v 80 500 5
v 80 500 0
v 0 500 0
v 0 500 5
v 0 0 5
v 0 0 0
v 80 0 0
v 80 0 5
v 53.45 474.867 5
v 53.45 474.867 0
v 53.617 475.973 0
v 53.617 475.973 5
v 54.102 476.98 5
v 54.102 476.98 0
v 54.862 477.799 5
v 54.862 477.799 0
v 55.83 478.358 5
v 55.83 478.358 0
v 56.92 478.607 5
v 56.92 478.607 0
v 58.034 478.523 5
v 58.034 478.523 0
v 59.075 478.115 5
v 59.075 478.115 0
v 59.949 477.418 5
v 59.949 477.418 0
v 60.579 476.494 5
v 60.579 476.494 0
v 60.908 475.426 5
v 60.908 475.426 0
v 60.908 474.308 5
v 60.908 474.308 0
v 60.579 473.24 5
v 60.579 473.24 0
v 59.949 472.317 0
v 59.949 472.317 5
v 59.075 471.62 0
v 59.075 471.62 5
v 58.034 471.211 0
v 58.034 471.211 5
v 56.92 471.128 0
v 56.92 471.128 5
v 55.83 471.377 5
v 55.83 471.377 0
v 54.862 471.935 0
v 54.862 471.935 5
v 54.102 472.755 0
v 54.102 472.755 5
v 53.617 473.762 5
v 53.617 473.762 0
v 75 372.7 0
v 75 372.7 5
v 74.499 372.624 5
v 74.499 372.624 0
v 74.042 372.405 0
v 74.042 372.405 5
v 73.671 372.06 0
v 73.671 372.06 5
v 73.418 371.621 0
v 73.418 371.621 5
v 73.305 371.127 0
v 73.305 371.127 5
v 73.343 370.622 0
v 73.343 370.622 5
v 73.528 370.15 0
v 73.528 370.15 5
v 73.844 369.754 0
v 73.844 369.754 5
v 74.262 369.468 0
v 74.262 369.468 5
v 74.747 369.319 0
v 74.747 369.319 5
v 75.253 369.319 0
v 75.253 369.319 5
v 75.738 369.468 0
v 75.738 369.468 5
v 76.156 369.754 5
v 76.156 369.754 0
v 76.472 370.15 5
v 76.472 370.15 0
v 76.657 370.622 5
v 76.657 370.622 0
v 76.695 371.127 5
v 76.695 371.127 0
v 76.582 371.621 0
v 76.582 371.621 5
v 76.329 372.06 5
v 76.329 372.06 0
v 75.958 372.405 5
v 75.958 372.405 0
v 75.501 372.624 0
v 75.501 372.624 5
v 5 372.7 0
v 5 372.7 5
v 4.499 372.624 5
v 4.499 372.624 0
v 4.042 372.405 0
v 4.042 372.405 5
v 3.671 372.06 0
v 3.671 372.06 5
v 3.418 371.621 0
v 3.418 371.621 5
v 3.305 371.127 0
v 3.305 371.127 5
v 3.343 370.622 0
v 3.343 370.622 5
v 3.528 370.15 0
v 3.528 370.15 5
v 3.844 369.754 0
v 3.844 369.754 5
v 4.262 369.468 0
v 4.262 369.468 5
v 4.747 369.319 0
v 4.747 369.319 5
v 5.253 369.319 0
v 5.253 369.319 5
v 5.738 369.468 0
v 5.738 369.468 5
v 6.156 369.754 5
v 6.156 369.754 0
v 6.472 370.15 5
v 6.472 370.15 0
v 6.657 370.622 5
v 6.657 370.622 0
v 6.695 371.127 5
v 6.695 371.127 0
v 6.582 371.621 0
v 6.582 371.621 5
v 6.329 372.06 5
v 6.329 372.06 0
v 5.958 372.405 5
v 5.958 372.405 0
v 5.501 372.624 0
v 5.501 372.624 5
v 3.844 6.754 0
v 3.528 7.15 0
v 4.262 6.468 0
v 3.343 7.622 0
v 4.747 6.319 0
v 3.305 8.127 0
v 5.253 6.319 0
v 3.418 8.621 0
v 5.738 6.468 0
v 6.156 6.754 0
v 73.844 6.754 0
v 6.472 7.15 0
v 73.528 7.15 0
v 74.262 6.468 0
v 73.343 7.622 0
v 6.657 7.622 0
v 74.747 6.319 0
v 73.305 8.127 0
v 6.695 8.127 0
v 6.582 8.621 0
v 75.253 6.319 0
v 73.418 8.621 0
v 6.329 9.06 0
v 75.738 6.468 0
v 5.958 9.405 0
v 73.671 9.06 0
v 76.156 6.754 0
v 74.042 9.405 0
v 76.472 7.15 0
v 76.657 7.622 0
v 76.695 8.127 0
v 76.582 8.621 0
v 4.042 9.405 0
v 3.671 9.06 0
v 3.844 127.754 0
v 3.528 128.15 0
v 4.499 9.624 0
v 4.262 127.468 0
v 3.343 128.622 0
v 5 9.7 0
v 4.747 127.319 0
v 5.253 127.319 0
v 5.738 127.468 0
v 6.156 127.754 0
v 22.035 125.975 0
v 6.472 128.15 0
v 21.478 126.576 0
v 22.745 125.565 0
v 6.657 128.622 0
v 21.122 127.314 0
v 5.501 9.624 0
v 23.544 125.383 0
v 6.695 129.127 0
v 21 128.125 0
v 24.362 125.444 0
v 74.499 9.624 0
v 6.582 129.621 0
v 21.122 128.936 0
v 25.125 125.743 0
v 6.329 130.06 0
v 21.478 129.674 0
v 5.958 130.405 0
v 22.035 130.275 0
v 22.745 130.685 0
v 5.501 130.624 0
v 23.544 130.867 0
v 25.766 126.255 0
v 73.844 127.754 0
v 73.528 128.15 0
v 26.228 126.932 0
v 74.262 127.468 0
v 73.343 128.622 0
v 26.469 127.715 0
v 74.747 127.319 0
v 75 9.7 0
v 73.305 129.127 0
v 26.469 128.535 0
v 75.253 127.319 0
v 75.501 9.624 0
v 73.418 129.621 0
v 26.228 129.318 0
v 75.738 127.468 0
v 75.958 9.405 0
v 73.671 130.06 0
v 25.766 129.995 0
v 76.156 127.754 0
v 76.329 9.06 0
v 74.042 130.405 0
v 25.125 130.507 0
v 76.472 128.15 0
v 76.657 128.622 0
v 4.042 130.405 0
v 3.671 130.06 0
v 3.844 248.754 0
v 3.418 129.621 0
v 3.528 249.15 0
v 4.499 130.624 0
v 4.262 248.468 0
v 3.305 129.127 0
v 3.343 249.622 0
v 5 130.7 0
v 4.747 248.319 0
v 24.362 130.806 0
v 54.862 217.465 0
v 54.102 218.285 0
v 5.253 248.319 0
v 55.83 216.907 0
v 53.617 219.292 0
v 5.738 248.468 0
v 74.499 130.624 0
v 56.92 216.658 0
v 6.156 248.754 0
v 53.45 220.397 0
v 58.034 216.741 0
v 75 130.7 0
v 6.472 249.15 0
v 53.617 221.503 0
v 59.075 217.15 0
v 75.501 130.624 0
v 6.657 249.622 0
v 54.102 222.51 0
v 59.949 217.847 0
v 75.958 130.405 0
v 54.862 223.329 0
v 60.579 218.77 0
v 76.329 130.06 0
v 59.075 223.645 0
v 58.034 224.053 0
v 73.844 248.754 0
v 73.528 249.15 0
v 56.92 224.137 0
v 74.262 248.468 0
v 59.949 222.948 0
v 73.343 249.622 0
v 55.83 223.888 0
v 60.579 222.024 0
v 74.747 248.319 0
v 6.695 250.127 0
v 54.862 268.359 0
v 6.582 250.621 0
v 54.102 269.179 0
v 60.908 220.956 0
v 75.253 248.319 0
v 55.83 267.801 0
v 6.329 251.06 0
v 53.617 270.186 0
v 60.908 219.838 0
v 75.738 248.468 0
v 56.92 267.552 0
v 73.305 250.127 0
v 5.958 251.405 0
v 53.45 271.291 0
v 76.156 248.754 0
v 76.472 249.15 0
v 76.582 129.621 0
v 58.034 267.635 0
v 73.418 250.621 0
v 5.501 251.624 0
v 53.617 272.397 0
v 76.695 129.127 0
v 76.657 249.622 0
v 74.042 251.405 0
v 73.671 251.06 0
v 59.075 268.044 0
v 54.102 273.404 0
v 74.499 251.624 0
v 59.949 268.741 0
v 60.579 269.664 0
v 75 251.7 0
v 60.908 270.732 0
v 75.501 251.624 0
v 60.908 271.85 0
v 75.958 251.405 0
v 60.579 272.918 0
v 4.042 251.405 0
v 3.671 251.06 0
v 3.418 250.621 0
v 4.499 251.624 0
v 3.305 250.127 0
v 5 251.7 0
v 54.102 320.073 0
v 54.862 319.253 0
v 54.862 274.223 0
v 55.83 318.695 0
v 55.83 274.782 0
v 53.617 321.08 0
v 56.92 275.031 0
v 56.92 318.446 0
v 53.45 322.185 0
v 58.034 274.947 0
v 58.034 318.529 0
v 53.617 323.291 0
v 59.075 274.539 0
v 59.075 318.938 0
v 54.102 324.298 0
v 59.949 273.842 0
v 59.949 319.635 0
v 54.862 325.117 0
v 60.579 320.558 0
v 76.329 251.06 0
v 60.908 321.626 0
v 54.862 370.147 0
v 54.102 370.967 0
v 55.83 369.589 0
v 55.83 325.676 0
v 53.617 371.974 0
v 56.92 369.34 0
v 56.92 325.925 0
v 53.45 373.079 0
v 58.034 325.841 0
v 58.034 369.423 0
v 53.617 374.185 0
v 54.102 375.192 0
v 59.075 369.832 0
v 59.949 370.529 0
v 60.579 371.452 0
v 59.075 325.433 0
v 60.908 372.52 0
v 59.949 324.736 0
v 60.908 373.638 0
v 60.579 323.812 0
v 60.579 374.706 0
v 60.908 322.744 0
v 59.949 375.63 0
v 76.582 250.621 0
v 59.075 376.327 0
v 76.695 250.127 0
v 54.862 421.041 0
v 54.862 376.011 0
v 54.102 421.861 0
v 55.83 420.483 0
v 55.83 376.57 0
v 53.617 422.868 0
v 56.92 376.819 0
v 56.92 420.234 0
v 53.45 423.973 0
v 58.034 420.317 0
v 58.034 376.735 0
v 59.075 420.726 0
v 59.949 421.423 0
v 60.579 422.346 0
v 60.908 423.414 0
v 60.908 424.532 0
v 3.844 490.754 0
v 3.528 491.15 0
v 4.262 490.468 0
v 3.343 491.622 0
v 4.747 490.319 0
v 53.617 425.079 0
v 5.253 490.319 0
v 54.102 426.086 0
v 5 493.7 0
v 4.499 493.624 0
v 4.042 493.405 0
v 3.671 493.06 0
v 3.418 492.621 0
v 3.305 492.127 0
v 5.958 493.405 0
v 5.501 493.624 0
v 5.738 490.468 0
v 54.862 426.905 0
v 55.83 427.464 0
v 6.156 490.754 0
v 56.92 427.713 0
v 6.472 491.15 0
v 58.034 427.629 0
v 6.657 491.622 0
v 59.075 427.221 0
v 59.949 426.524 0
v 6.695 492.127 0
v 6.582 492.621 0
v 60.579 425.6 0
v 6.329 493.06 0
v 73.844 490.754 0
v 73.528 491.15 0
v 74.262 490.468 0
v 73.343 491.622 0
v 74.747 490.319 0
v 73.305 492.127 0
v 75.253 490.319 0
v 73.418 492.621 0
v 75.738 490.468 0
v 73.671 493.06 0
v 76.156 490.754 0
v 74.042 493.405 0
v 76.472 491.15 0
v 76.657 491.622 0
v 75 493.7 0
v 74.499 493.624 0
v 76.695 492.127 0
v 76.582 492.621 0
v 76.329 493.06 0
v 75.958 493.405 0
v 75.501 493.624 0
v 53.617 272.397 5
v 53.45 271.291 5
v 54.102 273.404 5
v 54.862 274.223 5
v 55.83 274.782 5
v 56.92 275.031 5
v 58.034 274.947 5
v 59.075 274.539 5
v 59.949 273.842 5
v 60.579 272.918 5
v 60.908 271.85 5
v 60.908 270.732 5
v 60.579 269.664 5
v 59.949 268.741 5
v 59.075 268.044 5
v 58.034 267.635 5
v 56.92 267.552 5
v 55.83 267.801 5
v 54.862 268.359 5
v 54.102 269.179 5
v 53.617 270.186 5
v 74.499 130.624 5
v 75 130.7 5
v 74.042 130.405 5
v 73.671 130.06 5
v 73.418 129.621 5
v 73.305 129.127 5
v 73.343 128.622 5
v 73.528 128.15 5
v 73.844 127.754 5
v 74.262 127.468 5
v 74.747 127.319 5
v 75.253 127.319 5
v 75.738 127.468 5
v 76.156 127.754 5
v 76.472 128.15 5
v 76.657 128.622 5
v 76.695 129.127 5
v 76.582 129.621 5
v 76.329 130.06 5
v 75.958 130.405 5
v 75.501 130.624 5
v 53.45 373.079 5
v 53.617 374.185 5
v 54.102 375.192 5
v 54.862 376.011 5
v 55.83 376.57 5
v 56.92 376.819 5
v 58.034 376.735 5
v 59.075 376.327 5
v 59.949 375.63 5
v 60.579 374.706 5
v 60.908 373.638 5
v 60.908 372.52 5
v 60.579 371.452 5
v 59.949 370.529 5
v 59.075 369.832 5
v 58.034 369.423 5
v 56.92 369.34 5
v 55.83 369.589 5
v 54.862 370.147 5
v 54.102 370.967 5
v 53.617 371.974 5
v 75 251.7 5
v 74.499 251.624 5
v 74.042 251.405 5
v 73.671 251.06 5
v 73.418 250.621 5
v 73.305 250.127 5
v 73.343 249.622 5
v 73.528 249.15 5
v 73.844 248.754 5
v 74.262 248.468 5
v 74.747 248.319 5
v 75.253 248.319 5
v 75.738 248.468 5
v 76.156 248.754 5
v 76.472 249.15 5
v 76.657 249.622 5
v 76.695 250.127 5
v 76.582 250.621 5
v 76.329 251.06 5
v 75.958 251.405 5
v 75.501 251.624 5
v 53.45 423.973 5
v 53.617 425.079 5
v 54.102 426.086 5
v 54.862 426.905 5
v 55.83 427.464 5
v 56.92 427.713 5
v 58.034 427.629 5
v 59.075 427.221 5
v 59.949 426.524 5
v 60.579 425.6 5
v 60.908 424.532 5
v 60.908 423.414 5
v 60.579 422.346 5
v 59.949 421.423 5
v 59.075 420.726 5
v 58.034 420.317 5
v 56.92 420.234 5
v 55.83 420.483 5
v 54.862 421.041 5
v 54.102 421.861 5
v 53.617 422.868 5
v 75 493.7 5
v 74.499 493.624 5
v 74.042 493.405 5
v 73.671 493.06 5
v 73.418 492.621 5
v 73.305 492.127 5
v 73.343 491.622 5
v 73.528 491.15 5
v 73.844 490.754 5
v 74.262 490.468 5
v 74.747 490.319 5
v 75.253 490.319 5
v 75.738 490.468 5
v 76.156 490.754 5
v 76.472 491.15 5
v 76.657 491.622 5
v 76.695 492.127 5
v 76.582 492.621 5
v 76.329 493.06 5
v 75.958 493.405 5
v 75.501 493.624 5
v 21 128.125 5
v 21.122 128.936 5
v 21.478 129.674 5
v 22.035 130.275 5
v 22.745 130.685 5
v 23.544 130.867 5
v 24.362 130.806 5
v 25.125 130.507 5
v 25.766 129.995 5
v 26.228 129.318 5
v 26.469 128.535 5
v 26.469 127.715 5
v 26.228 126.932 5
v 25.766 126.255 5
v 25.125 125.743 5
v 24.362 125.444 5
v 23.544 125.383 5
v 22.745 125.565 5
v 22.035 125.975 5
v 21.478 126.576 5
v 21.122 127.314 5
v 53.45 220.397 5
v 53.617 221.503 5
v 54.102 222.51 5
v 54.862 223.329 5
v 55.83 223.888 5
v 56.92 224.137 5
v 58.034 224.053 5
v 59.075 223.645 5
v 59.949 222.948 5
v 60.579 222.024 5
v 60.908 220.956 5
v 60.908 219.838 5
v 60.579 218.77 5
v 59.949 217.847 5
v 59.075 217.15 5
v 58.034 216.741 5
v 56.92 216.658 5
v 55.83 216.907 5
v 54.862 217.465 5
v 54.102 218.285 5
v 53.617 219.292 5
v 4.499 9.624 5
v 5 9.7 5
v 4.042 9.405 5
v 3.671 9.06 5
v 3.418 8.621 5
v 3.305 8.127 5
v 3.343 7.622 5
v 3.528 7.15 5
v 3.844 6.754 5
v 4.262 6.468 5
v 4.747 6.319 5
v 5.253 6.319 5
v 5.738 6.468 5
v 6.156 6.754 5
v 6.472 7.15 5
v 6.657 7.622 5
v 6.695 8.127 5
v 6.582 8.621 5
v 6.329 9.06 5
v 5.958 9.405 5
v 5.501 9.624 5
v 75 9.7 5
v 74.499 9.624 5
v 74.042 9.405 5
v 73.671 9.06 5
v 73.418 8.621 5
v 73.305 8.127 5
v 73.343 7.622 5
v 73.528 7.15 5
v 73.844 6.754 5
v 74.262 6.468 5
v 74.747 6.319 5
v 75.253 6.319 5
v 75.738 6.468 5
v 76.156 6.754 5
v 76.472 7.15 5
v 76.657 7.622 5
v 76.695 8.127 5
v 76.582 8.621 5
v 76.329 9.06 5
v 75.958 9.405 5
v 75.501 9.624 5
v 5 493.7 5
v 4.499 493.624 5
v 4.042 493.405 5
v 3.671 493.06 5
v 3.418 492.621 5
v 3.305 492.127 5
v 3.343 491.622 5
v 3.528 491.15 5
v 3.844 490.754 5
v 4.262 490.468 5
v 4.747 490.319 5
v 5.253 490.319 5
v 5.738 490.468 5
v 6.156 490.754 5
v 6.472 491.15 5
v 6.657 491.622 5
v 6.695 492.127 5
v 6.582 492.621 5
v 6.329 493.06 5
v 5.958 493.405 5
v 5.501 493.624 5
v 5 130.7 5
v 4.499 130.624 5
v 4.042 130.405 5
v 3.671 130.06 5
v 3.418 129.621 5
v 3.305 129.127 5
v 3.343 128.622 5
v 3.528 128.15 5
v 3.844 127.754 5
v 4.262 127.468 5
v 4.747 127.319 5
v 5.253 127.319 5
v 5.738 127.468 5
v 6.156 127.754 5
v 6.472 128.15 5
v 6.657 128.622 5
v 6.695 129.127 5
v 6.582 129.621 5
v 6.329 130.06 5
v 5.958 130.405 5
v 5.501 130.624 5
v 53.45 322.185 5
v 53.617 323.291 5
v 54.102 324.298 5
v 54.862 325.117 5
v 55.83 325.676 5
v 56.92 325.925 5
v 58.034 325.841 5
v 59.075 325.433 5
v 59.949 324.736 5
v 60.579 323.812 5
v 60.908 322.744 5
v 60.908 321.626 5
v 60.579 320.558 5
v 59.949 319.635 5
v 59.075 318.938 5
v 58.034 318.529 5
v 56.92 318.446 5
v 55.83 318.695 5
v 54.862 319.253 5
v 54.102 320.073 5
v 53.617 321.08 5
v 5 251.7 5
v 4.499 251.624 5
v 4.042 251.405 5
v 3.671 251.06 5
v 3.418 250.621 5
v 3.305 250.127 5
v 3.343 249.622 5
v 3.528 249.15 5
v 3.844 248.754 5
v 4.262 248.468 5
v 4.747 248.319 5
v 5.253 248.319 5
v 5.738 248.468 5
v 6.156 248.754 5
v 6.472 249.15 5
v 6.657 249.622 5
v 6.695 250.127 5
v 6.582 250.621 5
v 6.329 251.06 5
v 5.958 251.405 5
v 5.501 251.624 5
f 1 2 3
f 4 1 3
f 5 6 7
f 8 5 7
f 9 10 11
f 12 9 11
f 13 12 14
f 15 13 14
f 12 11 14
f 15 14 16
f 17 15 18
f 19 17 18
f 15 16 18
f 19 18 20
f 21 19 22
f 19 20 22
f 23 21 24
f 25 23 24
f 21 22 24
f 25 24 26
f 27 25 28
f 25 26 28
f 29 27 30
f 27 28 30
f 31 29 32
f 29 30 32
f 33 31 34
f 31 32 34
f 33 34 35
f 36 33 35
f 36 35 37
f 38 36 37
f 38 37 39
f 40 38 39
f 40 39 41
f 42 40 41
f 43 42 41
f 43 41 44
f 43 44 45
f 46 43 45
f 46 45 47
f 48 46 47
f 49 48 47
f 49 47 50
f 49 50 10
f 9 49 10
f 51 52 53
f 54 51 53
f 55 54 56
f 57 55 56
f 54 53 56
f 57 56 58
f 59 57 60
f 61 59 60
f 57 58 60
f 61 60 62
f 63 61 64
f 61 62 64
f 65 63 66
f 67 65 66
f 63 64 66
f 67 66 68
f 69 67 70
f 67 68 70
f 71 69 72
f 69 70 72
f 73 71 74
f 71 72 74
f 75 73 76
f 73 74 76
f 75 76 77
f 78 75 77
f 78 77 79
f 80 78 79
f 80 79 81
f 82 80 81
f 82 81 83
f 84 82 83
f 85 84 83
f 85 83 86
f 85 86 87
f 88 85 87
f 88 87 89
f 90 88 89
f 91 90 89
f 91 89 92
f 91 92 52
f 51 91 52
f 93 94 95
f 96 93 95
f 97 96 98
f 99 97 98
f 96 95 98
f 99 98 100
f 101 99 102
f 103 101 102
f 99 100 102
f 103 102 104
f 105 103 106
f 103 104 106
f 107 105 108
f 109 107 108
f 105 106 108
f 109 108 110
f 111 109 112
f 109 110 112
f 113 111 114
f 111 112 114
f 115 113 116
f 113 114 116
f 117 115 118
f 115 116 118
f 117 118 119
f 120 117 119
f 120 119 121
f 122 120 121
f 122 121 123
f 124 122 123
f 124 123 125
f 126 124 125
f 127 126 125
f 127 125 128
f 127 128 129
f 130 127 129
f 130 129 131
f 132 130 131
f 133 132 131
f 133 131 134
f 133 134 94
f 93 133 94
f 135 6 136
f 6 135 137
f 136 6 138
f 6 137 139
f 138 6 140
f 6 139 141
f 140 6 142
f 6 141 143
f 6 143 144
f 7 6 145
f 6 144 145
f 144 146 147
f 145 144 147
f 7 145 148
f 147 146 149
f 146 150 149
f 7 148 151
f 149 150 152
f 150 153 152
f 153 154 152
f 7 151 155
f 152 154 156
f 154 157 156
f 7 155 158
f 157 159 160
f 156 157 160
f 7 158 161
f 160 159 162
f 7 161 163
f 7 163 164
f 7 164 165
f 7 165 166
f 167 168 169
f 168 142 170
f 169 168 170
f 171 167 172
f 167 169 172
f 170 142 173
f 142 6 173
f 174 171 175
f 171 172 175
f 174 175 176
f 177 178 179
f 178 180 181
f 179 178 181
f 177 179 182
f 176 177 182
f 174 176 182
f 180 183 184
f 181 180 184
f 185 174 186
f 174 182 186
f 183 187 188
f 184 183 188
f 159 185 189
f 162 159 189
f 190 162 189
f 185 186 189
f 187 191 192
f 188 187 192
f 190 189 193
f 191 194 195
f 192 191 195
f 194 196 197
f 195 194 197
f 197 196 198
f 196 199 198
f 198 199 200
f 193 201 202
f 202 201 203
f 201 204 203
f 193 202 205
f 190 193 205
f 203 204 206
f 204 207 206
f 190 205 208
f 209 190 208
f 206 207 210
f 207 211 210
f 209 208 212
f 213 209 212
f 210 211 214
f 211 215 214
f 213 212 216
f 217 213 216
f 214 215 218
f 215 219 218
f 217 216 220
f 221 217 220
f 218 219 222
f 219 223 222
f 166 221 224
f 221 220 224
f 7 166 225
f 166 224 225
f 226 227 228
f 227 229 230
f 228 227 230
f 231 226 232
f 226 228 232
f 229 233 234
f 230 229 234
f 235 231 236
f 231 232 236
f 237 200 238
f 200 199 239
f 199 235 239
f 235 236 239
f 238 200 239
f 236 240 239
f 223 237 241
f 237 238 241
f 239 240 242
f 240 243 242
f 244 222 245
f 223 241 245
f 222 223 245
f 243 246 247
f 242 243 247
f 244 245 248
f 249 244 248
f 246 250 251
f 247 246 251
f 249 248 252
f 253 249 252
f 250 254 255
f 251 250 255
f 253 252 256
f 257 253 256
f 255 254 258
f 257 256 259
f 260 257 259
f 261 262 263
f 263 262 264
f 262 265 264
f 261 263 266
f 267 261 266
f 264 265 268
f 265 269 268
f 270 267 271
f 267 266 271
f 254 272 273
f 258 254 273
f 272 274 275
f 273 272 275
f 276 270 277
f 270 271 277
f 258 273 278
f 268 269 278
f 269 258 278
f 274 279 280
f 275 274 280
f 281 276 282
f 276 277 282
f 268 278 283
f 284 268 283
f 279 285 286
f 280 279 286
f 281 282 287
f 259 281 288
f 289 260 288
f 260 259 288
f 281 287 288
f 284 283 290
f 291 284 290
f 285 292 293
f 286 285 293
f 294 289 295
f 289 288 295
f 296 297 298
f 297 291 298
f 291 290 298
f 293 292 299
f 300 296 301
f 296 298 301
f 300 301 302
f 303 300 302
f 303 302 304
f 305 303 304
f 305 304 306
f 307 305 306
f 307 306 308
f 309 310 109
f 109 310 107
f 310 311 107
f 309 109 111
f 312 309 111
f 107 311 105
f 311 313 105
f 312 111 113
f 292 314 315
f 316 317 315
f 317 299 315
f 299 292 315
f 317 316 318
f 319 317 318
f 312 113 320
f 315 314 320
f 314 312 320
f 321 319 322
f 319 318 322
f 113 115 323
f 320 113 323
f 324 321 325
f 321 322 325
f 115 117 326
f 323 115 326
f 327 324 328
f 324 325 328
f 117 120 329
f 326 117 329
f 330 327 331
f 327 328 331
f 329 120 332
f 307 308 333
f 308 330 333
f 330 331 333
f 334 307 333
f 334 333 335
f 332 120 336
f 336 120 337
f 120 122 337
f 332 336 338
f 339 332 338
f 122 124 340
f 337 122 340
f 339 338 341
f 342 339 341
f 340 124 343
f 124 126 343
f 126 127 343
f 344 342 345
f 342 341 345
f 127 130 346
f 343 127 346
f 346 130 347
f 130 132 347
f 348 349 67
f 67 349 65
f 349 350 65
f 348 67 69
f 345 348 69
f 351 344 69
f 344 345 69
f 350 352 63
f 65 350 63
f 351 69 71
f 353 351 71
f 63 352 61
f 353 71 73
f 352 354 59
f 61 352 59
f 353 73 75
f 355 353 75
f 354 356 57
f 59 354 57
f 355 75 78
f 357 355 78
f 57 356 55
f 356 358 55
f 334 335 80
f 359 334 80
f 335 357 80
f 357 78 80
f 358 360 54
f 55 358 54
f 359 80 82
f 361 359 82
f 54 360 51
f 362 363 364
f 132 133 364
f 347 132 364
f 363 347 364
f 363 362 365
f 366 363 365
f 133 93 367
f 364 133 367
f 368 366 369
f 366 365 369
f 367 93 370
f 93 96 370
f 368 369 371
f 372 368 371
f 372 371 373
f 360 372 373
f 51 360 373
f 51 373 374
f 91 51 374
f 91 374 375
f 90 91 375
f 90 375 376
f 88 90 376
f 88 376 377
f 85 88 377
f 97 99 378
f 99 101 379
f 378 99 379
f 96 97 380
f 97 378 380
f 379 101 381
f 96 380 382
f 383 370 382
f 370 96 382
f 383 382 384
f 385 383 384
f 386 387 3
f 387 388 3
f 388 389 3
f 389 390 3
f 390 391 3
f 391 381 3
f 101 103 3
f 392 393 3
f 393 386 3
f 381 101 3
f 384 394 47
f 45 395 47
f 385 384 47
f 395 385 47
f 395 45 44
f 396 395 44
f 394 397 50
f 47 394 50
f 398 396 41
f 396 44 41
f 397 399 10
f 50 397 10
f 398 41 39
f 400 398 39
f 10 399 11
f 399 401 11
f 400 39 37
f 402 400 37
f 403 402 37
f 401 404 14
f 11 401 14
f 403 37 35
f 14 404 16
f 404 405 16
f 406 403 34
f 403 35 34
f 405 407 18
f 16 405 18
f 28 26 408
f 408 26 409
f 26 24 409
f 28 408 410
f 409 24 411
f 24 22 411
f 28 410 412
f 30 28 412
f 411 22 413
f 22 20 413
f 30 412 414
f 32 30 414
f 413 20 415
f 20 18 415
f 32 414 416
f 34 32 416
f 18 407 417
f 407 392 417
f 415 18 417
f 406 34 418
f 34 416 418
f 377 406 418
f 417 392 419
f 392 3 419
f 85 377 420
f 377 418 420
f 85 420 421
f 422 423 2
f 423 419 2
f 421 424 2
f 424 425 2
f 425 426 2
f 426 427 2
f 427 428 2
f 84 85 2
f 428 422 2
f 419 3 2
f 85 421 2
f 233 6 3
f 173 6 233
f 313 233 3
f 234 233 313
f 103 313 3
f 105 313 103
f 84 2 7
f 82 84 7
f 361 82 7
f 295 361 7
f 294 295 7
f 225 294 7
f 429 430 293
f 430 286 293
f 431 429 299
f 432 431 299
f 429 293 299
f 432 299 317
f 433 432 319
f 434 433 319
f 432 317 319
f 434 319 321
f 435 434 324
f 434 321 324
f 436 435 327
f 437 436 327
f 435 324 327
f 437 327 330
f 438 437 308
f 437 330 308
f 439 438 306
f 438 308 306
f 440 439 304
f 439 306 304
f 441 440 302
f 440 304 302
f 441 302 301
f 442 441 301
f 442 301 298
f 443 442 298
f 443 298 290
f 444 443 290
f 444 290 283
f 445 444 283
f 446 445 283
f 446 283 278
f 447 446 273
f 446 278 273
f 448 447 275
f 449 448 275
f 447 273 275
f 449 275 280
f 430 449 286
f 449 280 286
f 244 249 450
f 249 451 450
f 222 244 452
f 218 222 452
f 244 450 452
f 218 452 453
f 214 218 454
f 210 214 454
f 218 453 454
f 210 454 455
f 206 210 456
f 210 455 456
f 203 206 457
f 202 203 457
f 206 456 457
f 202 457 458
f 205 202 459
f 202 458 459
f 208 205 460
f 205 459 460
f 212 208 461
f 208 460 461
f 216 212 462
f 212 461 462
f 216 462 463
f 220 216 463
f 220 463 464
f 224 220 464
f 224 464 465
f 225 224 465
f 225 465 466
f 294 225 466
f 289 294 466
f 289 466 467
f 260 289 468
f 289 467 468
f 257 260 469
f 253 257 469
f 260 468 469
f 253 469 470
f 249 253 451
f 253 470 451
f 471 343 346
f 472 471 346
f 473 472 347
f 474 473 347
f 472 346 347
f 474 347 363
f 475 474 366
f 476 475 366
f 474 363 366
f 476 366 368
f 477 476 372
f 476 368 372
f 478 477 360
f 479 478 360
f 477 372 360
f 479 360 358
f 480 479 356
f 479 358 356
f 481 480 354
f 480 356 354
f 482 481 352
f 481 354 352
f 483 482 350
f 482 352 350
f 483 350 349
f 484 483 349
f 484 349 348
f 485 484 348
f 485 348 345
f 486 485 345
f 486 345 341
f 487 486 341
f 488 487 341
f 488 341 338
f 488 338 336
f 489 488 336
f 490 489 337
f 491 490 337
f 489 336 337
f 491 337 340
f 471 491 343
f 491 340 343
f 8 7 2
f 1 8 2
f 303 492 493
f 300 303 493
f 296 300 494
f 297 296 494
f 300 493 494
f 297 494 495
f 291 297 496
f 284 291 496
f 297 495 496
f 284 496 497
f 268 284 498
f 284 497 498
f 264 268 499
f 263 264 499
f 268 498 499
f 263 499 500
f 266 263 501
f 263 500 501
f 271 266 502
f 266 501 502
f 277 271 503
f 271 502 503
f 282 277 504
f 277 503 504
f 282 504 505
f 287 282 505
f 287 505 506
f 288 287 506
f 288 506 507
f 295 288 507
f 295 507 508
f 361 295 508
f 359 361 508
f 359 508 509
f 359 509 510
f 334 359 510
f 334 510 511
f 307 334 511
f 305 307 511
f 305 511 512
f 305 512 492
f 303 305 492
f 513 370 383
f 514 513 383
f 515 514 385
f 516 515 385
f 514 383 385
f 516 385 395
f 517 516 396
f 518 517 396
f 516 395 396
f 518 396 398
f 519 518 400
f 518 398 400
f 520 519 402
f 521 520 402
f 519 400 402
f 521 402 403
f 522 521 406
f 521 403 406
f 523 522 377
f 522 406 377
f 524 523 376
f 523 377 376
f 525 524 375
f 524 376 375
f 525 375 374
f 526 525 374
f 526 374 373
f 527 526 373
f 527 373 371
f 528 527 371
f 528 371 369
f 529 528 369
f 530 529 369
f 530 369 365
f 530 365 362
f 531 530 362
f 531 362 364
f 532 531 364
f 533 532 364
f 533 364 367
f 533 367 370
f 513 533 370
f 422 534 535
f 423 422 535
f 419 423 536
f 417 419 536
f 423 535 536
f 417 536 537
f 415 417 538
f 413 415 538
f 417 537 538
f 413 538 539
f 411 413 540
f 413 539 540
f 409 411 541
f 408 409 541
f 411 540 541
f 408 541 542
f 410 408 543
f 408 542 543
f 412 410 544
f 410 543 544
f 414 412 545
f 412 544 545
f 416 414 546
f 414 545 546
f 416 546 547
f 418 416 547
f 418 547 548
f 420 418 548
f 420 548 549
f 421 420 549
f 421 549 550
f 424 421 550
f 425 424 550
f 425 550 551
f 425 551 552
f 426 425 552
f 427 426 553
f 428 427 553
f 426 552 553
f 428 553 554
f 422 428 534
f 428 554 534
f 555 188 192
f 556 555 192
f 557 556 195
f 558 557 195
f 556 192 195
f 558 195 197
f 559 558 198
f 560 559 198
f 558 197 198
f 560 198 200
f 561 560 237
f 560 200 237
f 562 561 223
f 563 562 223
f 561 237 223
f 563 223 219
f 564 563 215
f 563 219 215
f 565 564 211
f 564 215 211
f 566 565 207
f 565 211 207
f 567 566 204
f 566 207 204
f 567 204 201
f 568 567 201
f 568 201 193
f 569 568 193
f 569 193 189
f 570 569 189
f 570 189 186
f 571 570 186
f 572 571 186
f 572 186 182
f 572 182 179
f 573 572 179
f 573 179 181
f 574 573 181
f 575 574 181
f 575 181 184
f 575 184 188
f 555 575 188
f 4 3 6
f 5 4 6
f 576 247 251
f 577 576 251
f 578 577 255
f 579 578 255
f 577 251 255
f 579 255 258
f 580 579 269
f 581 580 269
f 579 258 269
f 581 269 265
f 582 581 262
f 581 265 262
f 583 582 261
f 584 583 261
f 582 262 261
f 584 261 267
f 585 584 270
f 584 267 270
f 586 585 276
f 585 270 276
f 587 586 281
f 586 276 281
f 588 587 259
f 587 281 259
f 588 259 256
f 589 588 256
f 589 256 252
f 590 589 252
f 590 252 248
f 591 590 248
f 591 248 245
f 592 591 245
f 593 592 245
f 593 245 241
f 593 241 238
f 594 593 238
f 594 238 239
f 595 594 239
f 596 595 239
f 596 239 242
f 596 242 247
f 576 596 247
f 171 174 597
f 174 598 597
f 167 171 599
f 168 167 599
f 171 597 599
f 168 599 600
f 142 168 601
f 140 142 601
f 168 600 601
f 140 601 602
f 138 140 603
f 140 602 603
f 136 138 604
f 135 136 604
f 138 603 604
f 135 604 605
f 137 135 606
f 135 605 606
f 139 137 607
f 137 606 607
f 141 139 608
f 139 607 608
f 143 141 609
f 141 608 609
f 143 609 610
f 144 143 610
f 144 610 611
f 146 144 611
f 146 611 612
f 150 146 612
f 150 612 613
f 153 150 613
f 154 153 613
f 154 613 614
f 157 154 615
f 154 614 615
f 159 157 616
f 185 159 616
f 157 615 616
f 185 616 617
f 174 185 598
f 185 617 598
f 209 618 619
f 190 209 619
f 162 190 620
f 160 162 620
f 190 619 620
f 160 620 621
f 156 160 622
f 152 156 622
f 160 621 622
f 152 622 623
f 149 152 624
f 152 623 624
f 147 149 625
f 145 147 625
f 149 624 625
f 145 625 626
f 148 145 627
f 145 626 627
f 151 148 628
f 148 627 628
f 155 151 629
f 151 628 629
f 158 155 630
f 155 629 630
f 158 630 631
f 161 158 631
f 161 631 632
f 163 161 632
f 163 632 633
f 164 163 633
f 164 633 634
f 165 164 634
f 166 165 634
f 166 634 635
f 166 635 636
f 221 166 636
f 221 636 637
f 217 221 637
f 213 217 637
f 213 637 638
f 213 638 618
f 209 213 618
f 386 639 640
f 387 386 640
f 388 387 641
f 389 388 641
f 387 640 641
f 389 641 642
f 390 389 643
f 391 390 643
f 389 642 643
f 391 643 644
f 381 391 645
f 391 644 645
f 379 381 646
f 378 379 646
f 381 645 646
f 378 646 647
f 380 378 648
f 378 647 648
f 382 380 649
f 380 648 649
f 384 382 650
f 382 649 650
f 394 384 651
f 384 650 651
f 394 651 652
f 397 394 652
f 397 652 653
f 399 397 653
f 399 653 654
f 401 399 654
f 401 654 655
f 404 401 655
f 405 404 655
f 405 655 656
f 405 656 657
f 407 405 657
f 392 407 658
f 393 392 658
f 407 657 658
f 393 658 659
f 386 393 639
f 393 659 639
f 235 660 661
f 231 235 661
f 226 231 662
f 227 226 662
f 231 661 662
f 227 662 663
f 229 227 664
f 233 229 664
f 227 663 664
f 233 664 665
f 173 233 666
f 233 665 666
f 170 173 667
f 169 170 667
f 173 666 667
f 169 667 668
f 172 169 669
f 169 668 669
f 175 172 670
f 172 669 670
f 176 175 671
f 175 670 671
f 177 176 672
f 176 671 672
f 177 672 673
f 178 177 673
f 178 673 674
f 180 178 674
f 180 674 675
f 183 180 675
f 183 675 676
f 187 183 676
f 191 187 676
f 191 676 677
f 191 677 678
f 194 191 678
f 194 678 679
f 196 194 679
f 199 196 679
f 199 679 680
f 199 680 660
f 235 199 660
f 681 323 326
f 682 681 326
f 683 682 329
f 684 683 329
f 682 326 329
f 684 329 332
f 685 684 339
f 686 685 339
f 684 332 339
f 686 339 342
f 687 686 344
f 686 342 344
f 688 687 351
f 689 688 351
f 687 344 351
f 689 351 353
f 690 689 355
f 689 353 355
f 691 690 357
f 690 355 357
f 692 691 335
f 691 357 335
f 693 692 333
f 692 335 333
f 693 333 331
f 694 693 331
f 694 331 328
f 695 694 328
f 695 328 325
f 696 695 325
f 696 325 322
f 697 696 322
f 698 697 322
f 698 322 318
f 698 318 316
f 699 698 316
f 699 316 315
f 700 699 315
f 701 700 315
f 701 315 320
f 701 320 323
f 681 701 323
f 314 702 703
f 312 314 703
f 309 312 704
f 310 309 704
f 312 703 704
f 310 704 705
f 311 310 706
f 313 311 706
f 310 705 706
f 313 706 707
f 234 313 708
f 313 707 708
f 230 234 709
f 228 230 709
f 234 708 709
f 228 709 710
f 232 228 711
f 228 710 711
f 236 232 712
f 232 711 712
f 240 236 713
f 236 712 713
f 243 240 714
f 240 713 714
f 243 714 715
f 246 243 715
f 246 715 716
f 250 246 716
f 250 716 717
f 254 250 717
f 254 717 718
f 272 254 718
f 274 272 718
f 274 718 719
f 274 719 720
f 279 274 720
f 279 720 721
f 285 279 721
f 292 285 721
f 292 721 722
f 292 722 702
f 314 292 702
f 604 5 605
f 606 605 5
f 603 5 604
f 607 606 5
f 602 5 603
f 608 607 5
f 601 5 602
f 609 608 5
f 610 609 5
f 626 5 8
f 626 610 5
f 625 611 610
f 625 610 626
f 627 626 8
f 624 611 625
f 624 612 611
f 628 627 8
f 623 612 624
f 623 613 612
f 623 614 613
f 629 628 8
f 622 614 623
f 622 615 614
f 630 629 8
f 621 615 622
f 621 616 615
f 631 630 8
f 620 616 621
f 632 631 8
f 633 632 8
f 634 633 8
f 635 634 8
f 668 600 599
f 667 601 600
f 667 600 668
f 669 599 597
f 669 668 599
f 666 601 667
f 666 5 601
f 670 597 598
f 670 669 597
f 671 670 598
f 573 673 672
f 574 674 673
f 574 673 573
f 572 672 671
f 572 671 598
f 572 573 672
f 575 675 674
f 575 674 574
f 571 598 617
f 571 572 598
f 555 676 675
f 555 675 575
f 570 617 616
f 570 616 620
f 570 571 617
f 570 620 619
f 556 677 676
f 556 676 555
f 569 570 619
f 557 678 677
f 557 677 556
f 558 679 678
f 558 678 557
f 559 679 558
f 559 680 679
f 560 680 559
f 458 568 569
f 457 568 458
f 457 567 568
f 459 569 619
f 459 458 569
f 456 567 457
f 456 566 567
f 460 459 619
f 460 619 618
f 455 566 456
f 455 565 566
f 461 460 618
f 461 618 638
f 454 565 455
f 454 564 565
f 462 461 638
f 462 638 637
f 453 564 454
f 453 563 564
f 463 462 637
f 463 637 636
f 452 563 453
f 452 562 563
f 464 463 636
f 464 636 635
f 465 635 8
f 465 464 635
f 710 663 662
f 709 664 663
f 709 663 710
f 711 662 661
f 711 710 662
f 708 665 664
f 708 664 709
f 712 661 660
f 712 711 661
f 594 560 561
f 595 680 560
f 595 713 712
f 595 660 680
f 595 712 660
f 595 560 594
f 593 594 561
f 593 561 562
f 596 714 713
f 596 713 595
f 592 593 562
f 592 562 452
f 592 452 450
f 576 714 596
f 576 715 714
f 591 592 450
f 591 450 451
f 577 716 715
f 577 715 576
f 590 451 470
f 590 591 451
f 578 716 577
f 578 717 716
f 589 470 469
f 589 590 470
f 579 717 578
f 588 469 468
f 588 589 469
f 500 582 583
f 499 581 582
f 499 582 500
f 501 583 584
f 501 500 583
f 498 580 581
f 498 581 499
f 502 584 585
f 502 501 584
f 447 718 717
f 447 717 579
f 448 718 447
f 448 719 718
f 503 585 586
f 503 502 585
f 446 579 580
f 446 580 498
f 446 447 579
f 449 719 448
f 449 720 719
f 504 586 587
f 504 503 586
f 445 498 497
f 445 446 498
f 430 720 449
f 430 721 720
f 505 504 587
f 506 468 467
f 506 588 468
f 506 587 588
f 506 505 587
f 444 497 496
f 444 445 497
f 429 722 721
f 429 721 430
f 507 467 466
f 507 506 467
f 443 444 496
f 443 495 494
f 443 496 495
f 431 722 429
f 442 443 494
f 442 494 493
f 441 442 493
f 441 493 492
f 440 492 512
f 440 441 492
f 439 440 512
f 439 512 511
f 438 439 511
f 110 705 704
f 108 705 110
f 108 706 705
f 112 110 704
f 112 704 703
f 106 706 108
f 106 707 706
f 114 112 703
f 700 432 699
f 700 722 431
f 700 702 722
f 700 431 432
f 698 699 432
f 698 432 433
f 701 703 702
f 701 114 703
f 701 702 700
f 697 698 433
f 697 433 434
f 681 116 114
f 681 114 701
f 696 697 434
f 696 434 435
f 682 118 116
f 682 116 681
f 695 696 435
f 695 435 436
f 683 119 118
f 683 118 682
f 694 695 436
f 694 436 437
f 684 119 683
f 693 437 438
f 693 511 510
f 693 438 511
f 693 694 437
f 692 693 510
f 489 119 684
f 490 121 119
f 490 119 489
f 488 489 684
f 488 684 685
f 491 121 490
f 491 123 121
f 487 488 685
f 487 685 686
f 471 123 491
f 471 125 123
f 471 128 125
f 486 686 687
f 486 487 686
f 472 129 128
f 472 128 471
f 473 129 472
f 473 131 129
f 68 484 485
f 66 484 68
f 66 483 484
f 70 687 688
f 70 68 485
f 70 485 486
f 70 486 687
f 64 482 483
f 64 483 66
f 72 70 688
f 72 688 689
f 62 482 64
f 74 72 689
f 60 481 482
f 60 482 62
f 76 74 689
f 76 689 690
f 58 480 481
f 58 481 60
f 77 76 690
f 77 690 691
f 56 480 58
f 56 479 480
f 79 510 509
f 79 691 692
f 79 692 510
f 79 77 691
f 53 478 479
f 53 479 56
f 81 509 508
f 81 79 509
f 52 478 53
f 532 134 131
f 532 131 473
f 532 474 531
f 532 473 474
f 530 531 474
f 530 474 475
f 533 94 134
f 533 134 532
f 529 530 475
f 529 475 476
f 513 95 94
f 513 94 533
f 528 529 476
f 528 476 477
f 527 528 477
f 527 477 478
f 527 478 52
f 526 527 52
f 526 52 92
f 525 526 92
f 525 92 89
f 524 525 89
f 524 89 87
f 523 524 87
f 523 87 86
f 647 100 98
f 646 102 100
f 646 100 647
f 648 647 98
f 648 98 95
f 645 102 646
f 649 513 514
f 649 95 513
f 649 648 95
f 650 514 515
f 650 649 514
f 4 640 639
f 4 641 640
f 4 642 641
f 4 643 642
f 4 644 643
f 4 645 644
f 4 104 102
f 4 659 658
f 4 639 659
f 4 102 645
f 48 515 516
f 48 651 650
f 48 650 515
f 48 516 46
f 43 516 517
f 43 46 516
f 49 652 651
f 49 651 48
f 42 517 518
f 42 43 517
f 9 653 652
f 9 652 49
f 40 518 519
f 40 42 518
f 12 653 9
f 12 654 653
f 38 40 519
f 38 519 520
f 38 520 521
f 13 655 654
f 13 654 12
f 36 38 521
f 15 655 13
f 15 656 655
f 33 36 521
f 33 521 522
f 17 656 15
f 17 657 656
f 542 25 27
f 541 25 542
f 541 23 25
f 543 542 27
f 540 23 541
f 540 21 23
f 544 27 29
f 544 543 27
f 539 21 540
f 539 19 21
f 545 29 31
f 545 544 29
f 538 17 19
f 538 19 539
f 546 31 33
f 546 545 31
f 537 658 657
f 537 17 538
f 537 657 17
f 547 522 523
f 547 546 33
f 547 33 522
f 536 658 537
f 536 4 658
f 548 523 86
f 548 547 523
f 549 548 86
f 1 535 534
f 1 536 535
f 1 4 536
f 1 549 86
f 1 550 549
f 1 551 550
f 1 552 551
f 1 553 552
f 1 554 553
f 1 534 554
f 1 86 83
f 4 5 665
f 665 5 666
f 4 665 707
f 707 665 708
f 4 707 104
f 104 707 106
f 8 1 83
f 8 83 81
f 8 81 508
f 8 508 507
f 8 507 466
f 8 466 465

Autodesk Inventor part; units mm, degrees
ref_plane "YZ Plane" through (0, 0, 0) normal (1, 0, 0) x (0, 1, 0)
ref_plane "XZ Plane" through (0, 0, 0) normal (0, 1, 0) x (-1, 0, 0)
sketch "Sketch1" plane through (0, 0, 0) normal (0, 0, 1) x (1, 0, 0)
  line L0 (0, 0) -> (80, 0)
  line L1 (80, 0) -> (80, 500)
  line L2 (80, 500) -> (0, 500)
  line L3 (0, 500) -> (0, 0)
  line L4 (40, 500) -> (40, 0) construction
  circle A0 centre (5, 492) radius 1.75 construction
  circle A1 centre (75, 492) radius 1.75 construction
  line L5 (5, 0) -> (5, 500) construction
  line L6 (75, 500) -> (75, 0) construction
  circle A2 centre (5, 371) radius 1.75 construction
  circle A3 centre (75, 371) radius 1.75 construction
  circle A4 centre (5, 250) radius 1.75 construction
  circle A5 centre (75, 250) radius 1.75 construction
  circle A6 centre (5, 129) radius 1.75 construction
  circle A7 centre (75, 129) radius 1.75 construction
  circle A8 centre (5, 8) radius 1.75 construction
  circle A9 centre (75, 8) radius 1.75 construction
  dimension "d0" = 500
  dimension "d2" = 3.5
  dimension "d5" = 5
  dimension "d6" = 8
  dimension "d13" = 5
  dimension "d14" = 5
  dimension "BackPlate_Width" = 80
  dimension "d20" = 121
extrude "Extrusion1" add sketch "Sketch1" along normal blind 5
hole "Bohrung1" at (5, 8, 0) at (75, 8, 0) at (75, 129, 0) at (5, 129, 0) at (5, 250, 0) at (75, 250, 0) at (5, 371, 0) at (75, 371, 0) at (5, 492, 0) at (75, 492, 0) direction (0, 0, 1) diameter 3.4 end through all clearance for "Inbusschraube DIN EN ISO 4762" size "M3" standard "DIN"
sketch "Skizze2" plane through (0, 0, 0) normal (0, 0, -1) x (-1, 0, 0)
  circle A0 centre (-23.75, 128.125) radius 2.75 projected
  circle A1 centre (-57.2, 220.3973) radius 3.75 projected
  circle A2 centre (-57.2, 271.2913) radius 3.75 projected
  circle A3 centre (-57.2, 322.1853) radius 3.75 projected
  circle A4 centre (-57.2, 373.0793) radius 3.75 projected
  circle A5 centre (-57.2, 423.9733) radius 3.75 projected
  circle A6 centre (-57.2, 474.8673) radius 3.75 projected
  point P0 (0, 0)
extrude "Extrusion2" cut sketch "Skizze2" against normal through all
sketch "Skizze3" plane through (0, 500, 0) normal (0, 1, 0) x (1, 0, 0)
  line L0 (80, 0) -> (0, 0) projected
  line L1 (0, 0) -> (0, -5) projected
  line L2 (80, -5) -> (0, -5) projected
  line L3 (80, 0) -> (80, -5) projected
  point P0 (0, 0)
ref_plane "Arbeitsebene1" through (71.8081, 420, 4.9726) normal (0, 1, 0) x (0, 0, 1)
equation "\"d0\" = GuidanceTrack_Length"
equation "\"d5\" = 0.5 * GuidanceTrac_OneSide_Thickness"
equation "\"d6\" = TopLit_Fixhole_Edge_Dist"
equation "\"d14\" = d13"
equation "\"BackPlate_Width\" = GuidanceTrac_Width"
equation "\"GuidanceTrack_Length\" = 500"
equation "\"GuidanceTrac_OneSide_Thickness\" = 10"
equation "\"TopLit_Fixhole_Edge_Dist\" = 8"
equation "\"GuidanceTrac_Width\" = 80"
properties part number "Back plate profile" material "PMMA-Kunststoff"
